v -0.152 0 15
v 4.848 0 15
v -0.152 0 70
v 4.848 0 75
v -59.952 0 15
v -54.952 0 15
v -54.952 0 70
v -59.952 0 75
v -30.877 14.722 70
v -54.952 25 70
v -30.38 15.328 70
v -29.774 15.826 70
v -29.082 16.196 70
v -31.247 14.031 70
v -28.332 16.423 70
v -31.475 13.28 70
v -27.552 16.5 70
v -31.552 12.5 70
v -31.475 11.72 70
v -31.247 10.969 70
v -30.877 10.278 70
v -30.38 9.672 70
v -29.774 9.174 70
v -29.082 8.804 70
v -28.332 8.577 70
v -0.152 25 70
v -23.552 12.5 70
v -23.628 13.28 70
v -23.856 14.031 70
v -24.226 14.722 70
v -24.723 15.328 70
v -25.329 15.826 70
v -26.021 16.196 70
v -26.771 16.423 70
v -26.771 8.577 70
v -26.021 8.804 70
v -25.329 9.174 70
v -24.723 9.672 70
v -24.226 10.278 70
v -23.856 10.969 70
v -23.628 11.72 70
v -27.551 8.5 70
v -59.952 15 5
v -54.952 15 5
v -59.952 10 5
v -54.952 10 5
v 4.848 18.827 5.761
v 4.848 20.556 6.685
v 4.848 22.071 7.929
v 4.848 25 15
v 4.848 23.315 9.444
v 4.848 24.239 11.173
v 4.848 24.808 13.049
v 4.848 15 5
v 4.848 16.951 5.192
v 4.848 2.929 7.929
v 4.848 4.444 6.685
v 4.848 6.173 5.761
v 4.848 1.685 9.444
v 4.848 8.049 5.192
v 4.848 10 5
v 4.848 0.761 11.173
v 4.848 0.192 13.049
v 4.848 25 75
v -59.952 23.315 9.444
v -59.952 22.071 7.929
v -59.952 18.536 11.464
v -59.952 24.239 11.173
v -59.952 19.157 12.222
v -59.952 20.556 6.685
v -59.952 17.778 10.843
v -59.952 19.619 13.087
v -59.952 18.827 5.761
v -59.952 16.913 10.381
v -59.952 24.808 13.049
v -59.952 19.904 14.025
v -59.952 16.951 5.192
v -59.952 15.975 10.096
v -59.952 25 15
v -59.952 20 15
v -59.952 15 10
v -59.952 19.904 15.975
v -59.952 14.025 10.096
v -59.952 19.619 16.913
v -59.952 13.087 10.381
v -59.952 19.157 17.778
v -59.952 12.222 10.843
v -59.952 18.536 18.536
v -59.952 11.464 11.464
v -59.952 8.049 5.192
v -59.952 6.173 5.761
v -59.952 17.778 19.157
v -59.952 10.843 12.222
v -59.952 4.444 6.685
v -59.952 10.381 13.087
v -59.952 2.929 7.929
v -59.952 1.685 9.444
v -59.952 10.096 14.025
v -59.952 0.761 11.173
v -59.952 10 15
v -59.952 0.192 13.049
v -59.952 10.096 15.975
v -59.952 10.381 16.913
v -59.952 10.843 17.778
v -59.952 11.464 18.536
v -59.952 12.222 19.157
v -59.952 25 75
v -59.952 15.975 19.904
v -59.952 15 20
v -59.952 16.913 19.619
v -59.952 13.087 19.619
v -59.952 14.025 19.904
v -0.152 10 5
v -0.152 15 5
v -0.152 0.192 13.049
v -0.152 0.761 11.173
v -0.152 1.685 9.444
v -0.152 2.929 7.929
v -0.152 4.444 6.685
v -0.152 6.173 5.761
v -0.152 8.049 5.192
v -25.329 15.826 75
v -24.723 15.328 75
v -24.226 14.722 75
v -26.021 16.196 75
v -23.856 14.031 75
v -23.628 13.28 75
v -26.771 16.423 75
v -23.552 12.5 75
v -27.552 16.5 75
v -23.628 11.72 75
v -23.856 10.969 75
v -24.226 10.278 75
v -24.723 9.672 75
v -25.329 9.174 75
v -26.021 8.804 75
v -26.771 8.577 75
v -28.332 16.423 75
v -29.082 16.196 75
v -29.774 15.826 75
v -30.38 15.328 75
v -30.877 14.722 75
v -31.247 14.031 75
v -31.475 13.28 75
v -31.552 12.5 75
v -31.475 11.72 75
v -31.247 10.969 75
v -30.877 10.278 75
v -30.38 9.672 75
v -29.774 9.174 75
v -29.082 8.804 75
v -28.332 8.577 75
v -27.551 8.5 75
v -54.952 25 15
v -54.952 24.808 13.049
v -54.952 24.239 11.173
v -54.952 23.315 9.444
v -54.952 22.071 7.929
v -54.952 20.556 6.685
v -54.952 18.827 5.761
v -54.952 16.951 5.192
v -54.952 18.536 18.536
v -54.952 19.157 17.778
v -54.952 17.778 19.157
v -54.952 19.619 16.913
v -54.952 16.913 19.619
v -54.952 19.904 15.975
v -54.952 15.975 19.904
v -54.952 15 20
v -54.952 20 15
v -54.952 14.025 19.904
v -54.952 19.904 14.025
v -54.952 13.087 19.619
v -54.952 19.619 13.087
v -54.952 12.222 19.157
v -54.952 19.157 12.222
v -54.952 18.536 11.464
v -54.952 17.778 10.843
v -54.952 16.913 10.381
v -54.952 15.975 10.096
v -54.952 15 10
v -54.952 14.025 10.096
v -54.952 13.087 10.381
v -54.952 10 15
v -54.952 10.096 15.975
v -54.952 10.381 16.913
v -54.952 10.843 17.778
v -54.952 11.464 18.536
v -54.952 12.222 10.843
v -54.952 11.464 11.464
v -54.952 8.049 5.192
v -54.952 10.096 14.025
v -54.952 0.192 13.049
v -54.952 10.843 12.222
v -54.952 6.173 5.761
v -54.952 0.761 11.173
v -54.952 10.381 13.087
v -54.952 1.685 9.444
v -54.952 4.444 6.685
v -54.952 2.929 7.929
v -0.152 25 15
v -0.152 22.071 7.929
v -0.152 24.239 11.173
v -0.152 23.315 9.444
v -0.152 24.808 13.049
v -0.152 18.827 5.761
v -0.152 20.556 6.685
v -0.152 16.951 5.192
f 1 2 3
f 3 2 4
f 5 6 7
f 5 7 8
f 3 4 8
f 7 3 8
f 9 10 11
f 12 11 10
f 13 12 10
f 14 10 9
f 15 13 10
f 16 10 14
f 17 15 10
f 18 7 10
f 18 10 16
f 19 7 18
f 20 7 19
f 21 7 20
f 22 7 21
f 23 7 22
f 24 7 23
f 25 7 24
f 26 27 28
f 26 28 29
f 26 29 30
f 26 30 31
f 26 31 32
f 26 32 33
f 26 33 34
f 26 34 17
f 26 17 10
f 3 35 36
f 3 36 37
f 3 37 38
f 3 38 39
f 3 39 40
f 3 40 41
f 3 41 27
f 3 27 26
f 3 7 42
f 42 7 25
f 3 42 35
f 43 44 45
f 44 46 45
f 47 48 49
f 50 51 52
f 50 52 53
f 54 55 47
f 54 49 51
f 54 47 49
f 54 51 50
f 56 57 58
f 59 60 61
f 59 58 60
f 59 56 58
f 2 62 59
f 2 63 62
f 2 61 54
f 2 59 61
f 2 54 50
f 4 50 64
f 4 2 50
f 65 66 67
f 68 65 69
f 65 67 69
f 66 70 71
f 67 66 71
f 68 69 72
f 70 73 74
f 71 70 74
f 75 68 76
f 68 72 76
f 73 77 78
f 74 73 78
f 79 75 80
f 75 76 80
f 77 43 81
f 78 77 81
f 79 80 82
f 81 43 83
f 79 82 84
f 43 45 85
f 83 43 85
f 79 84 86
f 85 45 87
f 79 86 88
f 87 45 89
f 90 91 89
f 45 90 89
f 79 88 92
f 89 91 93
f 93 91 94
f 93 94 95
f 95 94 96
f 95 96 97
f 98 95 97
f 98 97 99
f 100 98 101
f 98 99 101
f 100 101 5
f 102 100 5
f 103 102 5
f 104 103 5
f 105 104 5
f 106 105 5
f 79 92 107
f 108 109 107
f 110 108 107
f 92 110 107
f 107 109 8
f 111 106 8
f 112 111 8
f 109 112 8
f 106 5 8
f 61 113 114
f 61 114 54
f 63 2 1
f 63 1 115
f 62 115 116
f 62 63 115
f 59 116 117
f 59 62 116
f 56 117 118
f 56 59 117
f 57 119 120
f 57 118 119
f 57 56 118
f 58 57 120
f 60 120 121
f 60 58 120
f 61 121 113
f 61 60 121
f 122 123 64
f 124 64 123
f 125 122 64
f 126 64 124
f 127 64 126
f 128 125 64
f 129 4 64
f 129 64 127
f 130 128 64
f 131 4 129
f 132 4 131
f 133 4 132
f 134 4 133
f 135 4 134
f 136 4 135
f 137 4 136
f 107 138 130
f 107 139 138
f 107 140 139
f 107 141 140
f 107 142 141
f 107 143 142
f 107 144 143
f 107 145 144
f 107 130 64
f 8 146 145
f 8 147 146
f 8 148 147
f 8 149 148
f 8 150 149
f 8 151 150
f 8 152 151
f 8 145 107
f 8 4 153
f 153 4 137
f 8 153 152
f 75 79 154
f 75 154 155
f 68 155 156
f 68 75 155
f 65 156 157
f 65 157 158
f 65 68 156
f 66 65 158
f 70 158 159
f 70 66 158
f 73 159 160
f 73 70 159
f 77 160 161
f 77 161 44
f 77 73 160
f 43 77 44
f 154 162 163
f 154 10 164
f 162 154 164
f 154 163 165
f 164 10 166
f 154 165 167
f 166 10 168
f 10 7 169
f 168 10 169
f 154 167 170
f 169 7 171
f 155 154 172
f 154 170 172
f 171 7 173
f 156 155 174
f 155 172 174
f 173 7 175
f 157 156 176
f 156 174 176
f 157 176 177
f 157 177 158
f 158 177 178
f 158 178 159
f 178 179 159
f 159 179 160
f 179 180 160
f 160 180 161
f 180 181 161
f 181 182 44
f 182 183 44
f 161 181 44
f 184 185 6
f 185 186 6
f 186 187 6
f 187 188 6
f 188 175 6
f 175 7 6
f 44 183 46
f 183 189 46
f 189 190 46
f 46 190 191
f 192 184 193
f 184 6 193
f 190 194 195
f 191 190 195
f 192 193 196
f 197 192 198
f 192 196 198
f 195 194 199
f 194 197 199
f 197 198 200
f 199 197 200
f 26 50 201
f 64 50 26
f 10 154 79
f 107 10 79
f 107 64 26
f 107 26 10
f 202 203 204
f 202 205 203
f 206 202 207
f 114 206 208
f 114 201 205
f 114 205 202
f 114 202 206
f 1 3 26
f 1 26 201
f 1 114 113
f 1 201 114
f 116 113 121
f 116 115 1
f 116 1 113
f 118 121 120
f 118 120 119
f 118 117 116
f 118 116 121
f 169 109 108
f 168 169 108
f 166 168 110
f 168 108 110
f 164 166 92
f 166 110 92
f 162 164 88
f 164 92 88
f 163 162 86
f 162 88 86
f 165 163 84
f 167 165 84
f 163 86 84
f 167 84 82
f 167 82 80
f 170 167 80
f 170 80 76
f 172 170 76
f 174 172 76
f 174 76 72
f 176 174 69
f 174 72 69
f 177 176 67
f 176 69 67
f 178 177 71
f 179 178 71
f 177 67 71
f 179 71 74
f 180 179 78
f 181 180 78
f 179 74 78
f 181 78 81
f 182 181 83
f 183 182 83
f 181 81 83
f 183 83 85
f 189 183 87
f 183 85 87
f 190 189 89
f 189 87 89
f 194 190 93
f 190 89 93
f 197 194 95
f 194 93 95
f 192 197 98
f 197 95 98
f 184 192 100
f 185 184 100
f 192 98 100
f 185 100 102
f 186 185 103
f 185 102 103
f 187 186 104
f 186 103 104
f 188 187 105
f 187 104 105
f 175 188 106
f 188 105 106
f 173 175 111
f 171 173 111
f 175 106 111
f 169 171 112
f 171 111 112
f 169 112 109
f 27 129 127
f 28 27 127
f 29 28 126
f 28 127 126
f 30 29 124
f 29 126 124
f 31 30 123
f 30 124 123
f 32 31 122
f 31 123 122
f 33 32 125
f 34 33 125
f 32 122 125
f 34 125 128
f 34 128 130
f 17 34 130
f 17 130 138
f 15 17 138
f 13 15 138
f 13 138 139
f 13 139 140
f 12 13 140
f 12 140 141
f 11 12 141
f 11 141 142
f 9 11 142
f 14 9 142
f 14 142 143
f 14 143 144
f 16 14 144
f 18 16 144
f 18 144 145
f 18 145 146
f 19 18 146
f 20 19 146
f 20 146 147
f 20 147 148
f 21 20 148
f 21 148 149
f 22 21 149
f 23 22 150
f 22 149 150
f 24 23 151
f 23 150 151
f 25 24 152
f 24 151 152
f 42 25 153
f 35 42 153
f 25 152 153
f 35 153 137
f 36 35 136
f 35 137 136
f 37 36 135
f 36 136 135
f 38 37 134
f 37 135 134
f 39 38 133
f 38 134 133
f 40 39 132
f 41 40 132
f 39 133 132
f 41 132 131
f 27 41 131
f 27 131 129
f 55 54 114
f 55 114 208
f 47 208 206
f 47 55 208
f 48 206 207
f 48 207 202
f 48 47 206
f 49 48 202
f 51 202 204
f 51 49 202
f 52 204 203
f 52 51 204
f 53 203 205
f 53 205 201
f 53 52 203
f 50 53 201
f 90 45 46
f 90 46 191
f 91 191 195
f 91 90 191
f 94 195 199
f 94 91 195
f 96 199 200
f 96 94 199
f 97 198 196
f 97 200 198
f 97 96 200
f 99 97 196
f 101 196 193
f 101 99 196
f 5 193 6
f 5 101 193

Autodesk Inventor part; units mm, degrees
ref_plane "YZ Plane" through (0, 0, 0) normal (1, 0, 0) x (0, 1, 0)
ref_plane "XZ Plane" through (0, 0, 0) normal (0, 1, 0) x (-1, 0, 0)
ref_plane "XY Plane" through (0, 0, 0) normal (0, 0, 1) x (1, 0, 0)
sketch "Sketch1" plane through (0, 0, 0) normal (0, 1, 0) x (-1, 0, 0)
  line L0 (0.1515, 5) -> (-4.8485, 5)
  line L1 (-4.8485, 5) -> (-4.8485, 75)
  line L2 (-4.8485, 75) -> (0.1515, 75)
  line L3 (0.1515, 75) -> (0.1515, 5)
  line L4 (54.9515, 5) -> (54.9515, 58.2)
  line L5 (54.9515, 5) -> (59.9515, 5)
  line L6 (59.9515, 5) -> (59.9515, 75)
  line L7 (59.9515, 75) -> (54.9515, 75)
  line L8 (54.9515, 75) -> (54.9515, 5)
  line L9 (0.1515, 75) -> (54.9515, 75)
  line L10 (54.9515, 75) -> (54.9515, 70)
  line L11 (54.9515, 70) -> (0.1515, 70)
  line L12 (0.1515, 70) -> (0.1515, 75)
  point P0 (0, 0)
  point P1 (55.2, 35)
  dimension "d0" = 5
  dimension "d1" = 70
  dimension "d2" = 5
  dimension "d3" = 5
  dimension "d10" = 54.8
extrude "Extrusion1" add sketch "Sketch1" along normal blind 25
fillet "Fillet1" radius 10 4 edges at (2.3485, 25, 5) (-57.4515, 25, 5) (2.3485, 0, 5) (-57.4515, 0, 5)
sketch "Sketch2" plane through (-59.9515, 0, 75) normal (-1, 0, 0) x (0, 0, 1)
  arc A0 (-60, 25) -> (-70, 15) centre (-60, 15) ccw projected
  circle A1 centre (-60, 15) radius 5
  point P0 (-75, 0)
  dimension "d7" = 10
extrude "Extrusion2" cut sketch "Sketch2" against normal blind 5
sketch "Sketch3" plane through (-0.1515, 0, 70) normal (-1, 0, 0) x (0, 0, 1)
  circle A0 centre (-55, 15) radius 5 projected
  circle A1 centre (-55, 15) radius 5
  point P0 (-70, 0)
sketch "Sketch4" plane through (-59.9515, 0, 75) normal (0, 0, 1) x (1, 0, 0)
  circle A0 centre (32.4, 12.5) radius 4
  line L0 (0, 0) -> (64.8, 0) projected
  line L1 (0, 0) -> (0, 25) projected
  point P0 (59.9515, 0)
  dimension "d11" = 8
  dimension "d12" = 12.5
  dimension "d13" = 32.4
  dimension "d14" = 25
  dimension "d15" = 64.8
extrude "Extrusion3" cut sketch "Sketch4" against normal blind 5
properties part number "Hombro"
